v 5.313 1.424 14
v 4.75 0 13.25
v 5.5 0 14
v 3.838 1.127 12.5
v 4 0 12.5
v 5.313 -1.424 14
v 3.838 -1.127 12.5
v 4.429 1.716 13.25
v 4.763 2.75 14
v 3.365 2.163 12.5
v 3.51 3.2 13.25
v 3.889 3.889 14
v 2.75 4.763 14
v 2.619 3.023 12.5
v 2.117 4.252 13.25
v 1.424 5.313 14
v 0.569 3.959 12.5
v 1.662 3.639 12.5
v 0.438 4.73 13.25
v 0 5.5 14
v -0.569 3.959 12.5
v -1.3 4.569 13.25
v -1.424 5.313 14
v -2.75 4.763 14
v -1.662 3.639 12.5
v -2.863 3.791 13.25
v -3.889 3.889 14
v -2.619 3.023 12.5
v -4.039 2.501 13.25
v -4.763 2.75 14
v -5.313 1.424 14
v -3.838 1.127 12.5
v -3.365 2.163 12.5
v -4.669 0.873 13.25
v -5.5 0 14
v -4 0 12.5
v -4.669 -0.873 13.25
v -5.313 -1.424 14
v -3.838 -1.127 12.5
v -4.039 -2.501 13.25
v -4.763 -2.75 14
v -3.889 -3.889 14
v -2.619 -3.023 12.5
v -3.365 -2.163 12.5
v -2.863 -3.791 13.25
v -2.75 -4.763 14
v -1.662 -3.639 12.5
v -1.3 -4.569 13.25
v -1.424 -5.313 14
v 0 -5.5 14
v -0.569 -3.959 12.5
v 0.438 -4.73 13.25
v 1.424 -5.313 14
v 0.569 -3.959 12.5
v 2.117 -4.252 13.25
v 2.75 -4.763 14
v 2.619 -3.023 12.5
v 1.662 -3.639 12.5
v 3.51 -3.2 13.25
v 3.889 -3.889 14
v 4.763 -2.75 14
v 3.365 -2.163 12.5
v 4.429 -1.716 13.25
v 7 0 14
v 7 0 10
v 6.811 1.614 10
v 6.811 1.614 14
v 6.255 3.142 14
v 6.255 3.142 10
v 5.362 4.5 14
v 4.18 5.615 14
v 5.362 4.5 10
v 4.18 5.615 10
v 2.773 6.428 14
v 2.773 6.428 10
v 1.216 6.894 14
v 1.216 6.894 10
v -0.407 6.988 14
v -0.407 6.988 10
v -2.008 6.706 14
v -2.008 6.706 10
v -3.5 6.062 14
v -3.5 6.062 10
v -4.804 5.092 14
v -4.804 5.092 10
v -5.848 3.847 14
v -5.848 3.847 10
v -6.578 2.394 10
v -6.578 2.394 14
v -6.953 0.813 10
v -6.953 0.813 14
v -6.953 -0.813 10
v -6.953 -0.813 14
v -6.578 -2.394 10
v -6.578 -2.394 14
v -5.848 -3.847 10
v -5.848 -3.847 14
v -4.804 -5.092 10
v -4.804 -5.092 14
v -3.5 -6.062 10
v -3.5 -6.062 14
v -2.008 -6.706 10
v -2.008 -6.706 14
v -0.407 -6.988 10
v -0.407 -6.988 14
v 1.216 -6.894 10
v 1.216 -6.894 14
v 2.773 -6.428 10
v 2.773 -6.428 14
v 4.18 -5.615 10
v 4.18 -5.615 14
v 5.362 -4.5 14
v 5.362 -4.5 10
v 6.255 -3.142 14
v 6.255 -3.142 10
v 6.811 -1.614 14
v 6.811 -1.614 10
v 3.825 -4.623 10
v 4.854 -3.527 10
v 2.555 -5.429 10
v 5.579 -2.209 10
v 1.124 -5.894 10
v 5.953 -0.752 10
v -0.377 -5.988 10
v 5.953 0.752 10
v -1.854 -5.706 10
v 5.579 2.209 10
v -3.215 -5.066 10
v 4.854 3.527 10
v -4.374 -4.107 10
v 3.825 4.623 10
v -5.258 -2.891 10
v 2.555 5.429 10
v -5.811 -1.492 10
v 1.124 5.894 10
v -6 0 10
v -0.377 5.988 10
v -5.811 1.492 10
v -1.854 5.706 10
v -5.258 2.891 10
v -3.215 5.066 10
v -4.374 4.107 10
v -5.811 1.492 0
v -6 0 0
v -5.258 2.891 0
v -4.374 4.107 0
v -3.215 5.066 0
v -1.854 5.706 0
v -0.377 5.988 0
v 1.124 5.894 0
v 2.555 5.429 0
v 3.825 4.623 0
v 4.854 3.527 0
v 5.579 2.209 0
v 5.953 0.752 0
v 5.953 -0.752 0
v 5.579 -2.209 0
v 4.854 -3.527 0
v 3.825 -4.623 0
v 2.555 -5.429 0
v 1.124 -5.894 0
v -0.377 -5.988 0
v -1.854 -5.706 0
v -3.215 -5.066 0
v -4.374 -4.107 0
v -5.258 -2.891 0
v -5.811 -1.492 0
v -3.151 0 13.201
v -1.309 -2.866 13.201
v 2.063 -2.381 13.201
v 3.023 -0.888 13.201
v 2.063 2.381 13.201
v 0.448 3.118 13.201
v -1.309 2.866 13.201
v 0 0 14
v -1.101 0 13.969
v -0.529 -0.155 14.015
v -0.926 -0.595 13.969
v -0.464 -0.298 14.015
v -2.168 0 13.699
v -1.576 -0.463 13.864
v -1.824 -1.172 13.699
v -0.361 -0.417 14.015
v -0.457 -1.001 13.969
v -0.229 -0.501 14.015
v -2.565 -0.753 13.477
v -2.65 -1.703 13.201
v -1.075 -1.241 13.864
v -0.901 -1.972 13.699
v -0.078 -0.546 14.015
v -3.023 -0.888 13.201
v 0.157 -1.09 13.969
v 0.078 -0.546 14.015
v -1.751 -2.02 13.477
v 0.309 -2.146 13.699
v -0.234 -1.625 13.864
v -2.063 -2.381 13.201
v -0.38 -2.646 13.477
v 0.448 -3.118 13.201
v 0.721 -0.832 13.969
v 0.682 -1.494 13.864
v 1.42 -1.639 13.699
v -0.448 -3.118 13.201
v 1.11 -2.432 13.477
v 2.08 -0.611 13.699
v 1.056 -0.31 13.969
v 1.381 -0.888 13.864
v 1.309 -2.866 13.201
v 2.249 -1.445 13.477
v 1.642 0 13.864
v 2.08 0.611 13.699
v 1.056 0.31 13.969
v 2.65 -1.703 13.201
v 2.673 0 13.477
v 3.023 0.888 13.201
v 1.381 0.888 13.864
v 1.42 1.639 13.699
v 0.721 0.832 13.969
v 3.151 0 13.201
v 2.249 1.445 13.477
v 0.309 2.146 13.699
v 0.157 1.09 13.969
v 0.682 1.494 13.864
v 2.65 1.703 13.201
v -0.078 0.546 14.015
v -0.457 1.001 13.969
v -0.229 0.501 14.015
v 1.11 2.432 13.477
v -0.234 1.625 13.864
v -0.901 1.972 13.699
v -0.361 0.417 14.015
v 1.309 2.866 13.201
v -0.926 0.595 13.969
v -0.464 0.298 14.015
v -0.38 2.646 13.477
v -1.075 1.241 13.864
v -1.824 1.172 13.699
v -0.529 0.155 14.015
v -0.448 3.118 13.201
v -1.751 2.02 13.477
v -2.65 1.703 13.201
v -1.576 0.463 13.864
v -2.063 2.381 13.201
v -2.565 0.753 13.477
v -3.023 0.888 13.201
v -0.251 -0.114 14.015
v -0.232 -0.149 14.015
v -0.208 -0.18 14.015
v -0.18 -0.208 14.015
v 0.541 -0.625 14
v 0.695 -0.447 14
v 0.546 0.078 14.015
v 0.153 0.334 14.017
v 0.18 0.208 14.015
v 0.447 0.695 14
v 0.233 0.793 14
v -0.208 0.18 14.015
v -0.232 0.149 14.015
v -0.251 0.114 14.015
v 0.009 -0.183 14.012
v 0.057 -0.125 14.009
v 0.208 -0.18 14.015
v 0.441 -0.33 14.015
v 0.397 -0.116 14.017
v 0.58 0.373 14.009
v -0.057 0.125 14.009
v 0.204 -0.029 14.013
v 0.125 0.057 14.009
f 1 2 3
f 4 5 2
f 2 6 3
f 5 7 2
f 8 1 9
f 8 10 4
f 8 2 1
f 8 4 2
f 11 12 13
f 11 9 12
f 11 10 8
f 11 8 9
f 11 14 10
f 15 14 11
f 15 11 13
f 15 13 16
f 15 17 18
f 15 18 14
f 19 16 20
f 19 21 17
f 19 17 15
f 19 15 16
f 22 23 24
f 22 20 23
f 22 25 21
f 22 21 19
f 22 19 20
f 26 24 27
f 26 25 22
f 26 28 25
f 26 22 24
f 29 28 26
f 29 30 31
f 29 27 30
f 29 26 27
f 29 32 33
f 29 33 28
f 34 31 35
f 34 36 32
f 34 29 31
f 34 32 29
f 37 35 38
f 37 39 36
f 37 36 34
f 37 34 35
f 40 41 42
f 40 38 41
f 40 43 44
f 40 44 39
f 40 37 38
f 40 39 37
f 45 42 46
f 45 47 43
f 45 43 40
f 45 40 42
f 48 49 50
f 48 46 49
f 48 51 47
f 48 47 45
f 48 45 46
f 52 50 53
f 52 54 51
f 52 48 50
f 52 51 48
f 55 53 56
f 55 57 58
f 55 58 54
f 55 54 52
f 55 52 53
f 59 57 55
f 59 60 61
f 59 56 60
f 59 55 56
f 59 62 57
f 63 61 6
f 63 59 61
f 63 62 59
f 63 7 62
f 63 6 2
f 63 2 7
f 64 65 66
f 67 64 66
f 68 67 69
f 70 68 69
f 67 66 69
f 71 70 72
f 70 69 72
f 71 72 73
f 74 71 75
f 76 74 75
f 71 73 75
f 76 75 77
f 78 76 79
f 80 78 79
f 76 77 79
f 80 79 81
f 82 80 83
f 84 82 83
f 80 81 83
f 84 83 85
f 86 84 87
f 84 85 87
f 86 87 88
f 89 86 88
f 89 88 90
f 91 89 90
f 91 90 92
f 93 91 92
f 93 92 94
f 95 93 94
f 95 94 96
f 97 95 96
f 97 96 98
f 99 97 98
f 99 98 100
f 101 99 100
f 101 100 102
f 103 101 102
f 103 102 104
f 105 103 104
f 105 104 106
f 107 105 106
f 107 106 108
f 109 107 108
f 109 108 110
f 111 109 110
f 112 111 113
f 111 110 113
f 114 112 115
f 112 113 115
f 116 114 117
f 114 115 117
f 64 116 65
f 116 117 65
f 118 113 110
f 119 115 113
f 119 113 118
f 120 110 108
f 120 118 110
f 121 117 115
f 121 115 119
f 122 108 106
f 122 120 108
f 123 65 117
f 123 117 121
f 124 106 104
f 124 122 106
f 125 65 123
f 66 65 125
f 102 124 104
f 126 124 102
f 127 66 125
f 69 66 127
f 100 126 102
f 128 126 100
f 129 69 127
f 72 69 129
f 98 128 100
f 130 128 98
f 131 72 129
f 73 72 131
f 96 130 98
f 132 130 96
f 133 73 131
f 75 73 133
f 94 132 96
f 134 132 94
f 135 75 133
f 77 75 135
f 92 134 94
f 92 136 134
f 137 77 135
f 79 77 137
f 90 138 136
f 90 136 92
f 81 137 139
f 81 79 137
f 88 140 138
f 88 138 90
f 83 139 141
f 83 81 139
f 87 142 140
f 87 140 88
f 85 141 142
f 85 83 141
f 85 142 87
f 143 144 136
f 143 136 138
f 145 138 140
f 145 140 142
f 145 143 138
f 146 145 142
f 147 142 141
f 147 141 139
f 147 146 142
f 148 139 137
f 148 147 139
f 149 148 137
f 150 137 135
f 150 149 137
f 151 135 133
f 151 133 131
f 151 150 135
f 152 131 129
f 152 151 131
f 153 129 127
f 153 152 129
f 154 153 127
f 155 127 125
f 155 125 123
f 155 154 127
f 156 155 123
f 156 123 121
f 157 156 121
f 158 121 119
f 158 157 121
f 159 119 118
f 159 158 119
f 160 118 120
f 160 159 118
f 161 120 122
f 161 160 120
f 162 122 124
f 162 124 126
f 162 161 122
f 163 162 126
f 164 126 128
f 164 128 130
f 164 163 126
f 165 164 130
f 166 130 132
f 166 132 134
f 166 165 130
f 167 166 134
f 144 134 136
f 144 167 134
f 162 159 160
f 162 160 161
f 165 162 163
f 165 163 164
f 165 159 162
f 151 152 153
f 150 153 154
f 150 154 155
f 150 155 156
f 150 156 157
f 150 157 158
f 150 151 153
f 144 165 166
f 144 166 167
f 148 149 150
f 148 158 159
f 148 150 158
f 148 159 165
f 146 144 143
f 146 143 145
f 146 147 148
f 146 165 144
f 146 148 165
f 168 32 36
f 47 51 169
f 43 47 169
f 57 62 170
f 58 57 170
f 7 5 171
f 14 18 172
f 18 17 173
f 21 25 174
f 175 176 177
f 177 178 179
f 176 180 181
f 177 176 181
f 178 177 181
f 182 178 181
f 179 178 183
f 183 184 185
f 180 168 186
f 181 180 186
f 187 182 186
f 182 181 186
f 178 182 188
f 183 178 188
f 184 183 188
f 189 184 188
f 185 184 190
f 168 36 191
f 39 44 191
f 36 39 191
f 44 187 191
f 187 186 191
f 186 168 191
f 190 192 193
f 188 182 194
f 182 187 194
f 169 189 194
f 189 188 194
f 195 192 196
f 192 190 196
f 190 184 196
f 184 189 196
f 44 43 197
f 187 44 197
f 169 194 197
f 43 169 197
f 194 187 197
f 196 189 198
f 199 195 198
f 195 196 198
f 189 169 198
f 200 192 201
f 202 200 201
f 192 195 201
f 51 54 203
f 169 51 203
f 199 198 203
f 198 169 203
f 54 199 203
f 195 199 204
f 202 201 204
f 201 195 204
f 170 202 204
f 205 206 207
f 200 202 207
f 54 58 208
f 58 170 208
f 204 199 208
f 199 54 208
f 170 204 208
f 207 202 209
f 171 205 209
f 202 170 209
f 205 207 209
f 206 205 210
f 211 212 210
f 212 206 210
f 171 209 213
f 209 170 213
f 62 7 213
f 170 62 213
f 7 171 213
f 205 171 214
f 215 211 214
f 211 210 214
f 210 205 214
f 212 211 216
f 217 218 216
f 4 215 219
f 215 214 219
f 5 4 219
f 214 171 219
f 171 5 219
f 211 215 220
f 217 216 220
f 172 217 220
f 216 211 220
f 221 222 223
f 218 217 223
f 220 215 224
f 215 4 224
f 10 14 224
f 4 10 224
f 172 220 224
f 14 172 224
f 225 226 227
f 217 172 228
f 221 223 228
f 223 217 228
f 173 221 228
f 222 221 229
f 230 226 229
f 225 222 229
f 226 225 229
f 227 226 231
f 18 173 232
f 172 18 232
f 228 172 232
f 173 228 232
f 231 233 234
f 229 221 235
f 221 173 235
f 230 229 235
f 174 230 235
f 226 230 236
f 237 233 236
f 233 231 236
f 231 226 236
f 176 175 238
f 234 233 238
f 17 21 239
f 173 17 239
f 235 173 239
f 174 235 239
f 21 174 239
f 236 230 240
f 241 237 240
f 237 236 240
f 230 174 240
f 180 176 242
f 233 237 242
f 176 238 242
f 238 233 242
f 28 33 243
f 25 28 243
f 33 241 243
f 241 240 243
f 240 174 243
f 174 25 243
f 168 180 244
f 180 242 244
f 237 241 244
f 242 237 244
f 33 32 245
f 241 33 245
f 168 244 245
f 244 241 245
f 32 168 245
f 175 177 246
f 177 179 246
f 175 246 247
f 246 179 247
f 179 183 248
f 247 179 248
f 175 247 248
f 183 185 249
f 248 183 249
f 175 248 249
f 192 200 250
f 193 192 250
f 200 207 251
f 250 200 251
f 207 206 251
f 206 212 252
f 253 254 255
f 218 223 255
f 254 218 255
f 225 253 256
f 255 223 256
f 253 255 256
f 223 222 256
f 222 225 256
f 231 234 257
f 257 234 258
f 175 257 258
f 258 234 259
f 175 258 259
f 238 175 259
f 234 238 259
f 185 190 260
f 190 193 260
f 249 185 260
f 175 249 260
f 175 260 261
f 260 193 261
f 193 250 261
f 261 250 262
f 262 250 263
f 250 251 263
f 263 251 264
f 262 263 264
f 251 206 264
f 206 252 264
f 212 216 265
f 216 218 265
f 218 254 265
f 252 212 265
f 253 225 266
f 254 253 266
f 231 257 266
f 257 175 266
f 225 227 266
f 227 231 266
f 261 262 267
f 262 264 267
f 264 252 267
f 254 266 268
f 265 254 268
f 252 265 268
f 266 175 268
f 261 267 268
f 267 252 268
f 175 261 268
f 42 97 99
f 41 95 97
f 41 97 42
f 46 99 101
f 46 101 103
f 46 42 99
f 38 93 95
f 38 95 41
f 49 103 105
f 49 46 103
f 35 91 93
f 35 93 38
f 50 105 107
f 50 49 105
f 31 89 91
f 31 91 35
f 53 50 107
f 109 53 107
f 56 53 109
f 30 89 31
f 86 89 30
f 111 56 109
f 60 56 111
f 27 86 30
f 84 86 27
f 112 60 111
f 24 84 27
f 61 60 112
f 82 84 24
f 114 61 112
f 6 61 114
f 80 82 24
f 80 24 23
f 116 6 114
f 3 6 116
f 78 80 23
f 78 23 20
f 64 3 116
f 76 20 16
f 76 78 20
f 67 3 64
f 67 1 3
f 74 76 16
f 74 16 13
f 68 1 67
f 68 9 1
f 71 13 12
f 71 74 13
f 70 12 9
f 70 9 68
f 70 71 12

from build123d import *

# Parameters (mm, degrees)
SKETCH1_R           = 7
BOSS_EXTRUDE1_DEPTH = 14
SKETCH2_OUTSIDE_W   = 20.85
SKETCH2_OUTSIDE_H   = 20.85
SKETCH2_OUTSIDE_R   = 6
CUT_EXTRUDE1_DEPTH  = 10
SKETCH3_R           = 5.5
CUT_EXTRUDE2_DEPTH  = 1.5
CUT_EXTRUDE2_TAPER  = 45
SKETCH4_R           = 4
CUT_EXTRUDE3_DEPTH  = 12.5
SKETCH5_R           = 4
BOSS_EXTRUDE3_DEPTH = 12.5


with BuildPart() as part:
    # Sketch1 → Boss-Extrude1 (new body)
    with BuildSketch(Plane.XY):
        Circle(SKETCH1_R)
    extrude(amount=BOSS_EXTRUDE1_DEPTH)

    # Sketch2 outside → Cut-Extrude1 (cut)
    with BuildSketch(Plane(origin=(0, 0, 0), x_dir=(-1, 0, 0), z_dir=(0, 0, -1))):
        Rectangle(SKETCH2_OUTSIDE_W, SKETCH2_OUTSIDE_H)
        Circle(SKETCH2_OUTSIDE_R, mode=Mode.SUBTRACT)
    extrude(amount=-CUT_EXTRUDE1_DEPTH, mode=Mode.SUBTRACT)

    # Sketch3 → Cut-Extrude2 (cut)
    with BuildSketch(Plane.XY.offset(14)):
        Circle(SKETCH3_R)
    extrude(amount=-CUT_EXTRUDE2_DEPTH, taper=CUT_EXTRUDE2_TAPER, mode=Mode.SUBTRACT)

    # Sketch4 → Cut-Extrude3 (cut)
    with BuildSketch(Plane.XY.offset(12.5)):
        Circle(SKETCH4_R)
    extrude(amount=-CUT_EXTRUDE3_DEPTH, mode=Mode.SUBTRACT)



with BuildPart() as body_2:
    # Sketch5 → Boss-Extrude3 (new body)
    with BuildSketch(Plane(origin=(0, 0, 0), x_dir=(-1, 0, 0), z_dir=(0, 0, -1))):
        Circle(SKETCH5_R)
    extrude(amount=-BOSS_EXTRUDE3_DEPTH)


with BuildPart() as part_1:
    add(part.part)

    add(body_2.part)  # Revolve1 merges body 2
    # Sketch6 → Revolve1 (revolve)
    with BuildSketch(Plane(origin=(0, 0, 0), x_dir=(1, 0, 0), z_dir=(0, 1, 0))):
        with BuildLine():
            Line((-4, -12.5), (0, -12.5))
            Line((0, -12.5), (0, -14))
            ThreePointArc((0, -14), (-2.168263504, -13.698702678), (-4, -12.5))
        make_face()
    revolve(axis=Axis((0, 0, 12.5), (0, 0, 1)))


solid = part_1.part
